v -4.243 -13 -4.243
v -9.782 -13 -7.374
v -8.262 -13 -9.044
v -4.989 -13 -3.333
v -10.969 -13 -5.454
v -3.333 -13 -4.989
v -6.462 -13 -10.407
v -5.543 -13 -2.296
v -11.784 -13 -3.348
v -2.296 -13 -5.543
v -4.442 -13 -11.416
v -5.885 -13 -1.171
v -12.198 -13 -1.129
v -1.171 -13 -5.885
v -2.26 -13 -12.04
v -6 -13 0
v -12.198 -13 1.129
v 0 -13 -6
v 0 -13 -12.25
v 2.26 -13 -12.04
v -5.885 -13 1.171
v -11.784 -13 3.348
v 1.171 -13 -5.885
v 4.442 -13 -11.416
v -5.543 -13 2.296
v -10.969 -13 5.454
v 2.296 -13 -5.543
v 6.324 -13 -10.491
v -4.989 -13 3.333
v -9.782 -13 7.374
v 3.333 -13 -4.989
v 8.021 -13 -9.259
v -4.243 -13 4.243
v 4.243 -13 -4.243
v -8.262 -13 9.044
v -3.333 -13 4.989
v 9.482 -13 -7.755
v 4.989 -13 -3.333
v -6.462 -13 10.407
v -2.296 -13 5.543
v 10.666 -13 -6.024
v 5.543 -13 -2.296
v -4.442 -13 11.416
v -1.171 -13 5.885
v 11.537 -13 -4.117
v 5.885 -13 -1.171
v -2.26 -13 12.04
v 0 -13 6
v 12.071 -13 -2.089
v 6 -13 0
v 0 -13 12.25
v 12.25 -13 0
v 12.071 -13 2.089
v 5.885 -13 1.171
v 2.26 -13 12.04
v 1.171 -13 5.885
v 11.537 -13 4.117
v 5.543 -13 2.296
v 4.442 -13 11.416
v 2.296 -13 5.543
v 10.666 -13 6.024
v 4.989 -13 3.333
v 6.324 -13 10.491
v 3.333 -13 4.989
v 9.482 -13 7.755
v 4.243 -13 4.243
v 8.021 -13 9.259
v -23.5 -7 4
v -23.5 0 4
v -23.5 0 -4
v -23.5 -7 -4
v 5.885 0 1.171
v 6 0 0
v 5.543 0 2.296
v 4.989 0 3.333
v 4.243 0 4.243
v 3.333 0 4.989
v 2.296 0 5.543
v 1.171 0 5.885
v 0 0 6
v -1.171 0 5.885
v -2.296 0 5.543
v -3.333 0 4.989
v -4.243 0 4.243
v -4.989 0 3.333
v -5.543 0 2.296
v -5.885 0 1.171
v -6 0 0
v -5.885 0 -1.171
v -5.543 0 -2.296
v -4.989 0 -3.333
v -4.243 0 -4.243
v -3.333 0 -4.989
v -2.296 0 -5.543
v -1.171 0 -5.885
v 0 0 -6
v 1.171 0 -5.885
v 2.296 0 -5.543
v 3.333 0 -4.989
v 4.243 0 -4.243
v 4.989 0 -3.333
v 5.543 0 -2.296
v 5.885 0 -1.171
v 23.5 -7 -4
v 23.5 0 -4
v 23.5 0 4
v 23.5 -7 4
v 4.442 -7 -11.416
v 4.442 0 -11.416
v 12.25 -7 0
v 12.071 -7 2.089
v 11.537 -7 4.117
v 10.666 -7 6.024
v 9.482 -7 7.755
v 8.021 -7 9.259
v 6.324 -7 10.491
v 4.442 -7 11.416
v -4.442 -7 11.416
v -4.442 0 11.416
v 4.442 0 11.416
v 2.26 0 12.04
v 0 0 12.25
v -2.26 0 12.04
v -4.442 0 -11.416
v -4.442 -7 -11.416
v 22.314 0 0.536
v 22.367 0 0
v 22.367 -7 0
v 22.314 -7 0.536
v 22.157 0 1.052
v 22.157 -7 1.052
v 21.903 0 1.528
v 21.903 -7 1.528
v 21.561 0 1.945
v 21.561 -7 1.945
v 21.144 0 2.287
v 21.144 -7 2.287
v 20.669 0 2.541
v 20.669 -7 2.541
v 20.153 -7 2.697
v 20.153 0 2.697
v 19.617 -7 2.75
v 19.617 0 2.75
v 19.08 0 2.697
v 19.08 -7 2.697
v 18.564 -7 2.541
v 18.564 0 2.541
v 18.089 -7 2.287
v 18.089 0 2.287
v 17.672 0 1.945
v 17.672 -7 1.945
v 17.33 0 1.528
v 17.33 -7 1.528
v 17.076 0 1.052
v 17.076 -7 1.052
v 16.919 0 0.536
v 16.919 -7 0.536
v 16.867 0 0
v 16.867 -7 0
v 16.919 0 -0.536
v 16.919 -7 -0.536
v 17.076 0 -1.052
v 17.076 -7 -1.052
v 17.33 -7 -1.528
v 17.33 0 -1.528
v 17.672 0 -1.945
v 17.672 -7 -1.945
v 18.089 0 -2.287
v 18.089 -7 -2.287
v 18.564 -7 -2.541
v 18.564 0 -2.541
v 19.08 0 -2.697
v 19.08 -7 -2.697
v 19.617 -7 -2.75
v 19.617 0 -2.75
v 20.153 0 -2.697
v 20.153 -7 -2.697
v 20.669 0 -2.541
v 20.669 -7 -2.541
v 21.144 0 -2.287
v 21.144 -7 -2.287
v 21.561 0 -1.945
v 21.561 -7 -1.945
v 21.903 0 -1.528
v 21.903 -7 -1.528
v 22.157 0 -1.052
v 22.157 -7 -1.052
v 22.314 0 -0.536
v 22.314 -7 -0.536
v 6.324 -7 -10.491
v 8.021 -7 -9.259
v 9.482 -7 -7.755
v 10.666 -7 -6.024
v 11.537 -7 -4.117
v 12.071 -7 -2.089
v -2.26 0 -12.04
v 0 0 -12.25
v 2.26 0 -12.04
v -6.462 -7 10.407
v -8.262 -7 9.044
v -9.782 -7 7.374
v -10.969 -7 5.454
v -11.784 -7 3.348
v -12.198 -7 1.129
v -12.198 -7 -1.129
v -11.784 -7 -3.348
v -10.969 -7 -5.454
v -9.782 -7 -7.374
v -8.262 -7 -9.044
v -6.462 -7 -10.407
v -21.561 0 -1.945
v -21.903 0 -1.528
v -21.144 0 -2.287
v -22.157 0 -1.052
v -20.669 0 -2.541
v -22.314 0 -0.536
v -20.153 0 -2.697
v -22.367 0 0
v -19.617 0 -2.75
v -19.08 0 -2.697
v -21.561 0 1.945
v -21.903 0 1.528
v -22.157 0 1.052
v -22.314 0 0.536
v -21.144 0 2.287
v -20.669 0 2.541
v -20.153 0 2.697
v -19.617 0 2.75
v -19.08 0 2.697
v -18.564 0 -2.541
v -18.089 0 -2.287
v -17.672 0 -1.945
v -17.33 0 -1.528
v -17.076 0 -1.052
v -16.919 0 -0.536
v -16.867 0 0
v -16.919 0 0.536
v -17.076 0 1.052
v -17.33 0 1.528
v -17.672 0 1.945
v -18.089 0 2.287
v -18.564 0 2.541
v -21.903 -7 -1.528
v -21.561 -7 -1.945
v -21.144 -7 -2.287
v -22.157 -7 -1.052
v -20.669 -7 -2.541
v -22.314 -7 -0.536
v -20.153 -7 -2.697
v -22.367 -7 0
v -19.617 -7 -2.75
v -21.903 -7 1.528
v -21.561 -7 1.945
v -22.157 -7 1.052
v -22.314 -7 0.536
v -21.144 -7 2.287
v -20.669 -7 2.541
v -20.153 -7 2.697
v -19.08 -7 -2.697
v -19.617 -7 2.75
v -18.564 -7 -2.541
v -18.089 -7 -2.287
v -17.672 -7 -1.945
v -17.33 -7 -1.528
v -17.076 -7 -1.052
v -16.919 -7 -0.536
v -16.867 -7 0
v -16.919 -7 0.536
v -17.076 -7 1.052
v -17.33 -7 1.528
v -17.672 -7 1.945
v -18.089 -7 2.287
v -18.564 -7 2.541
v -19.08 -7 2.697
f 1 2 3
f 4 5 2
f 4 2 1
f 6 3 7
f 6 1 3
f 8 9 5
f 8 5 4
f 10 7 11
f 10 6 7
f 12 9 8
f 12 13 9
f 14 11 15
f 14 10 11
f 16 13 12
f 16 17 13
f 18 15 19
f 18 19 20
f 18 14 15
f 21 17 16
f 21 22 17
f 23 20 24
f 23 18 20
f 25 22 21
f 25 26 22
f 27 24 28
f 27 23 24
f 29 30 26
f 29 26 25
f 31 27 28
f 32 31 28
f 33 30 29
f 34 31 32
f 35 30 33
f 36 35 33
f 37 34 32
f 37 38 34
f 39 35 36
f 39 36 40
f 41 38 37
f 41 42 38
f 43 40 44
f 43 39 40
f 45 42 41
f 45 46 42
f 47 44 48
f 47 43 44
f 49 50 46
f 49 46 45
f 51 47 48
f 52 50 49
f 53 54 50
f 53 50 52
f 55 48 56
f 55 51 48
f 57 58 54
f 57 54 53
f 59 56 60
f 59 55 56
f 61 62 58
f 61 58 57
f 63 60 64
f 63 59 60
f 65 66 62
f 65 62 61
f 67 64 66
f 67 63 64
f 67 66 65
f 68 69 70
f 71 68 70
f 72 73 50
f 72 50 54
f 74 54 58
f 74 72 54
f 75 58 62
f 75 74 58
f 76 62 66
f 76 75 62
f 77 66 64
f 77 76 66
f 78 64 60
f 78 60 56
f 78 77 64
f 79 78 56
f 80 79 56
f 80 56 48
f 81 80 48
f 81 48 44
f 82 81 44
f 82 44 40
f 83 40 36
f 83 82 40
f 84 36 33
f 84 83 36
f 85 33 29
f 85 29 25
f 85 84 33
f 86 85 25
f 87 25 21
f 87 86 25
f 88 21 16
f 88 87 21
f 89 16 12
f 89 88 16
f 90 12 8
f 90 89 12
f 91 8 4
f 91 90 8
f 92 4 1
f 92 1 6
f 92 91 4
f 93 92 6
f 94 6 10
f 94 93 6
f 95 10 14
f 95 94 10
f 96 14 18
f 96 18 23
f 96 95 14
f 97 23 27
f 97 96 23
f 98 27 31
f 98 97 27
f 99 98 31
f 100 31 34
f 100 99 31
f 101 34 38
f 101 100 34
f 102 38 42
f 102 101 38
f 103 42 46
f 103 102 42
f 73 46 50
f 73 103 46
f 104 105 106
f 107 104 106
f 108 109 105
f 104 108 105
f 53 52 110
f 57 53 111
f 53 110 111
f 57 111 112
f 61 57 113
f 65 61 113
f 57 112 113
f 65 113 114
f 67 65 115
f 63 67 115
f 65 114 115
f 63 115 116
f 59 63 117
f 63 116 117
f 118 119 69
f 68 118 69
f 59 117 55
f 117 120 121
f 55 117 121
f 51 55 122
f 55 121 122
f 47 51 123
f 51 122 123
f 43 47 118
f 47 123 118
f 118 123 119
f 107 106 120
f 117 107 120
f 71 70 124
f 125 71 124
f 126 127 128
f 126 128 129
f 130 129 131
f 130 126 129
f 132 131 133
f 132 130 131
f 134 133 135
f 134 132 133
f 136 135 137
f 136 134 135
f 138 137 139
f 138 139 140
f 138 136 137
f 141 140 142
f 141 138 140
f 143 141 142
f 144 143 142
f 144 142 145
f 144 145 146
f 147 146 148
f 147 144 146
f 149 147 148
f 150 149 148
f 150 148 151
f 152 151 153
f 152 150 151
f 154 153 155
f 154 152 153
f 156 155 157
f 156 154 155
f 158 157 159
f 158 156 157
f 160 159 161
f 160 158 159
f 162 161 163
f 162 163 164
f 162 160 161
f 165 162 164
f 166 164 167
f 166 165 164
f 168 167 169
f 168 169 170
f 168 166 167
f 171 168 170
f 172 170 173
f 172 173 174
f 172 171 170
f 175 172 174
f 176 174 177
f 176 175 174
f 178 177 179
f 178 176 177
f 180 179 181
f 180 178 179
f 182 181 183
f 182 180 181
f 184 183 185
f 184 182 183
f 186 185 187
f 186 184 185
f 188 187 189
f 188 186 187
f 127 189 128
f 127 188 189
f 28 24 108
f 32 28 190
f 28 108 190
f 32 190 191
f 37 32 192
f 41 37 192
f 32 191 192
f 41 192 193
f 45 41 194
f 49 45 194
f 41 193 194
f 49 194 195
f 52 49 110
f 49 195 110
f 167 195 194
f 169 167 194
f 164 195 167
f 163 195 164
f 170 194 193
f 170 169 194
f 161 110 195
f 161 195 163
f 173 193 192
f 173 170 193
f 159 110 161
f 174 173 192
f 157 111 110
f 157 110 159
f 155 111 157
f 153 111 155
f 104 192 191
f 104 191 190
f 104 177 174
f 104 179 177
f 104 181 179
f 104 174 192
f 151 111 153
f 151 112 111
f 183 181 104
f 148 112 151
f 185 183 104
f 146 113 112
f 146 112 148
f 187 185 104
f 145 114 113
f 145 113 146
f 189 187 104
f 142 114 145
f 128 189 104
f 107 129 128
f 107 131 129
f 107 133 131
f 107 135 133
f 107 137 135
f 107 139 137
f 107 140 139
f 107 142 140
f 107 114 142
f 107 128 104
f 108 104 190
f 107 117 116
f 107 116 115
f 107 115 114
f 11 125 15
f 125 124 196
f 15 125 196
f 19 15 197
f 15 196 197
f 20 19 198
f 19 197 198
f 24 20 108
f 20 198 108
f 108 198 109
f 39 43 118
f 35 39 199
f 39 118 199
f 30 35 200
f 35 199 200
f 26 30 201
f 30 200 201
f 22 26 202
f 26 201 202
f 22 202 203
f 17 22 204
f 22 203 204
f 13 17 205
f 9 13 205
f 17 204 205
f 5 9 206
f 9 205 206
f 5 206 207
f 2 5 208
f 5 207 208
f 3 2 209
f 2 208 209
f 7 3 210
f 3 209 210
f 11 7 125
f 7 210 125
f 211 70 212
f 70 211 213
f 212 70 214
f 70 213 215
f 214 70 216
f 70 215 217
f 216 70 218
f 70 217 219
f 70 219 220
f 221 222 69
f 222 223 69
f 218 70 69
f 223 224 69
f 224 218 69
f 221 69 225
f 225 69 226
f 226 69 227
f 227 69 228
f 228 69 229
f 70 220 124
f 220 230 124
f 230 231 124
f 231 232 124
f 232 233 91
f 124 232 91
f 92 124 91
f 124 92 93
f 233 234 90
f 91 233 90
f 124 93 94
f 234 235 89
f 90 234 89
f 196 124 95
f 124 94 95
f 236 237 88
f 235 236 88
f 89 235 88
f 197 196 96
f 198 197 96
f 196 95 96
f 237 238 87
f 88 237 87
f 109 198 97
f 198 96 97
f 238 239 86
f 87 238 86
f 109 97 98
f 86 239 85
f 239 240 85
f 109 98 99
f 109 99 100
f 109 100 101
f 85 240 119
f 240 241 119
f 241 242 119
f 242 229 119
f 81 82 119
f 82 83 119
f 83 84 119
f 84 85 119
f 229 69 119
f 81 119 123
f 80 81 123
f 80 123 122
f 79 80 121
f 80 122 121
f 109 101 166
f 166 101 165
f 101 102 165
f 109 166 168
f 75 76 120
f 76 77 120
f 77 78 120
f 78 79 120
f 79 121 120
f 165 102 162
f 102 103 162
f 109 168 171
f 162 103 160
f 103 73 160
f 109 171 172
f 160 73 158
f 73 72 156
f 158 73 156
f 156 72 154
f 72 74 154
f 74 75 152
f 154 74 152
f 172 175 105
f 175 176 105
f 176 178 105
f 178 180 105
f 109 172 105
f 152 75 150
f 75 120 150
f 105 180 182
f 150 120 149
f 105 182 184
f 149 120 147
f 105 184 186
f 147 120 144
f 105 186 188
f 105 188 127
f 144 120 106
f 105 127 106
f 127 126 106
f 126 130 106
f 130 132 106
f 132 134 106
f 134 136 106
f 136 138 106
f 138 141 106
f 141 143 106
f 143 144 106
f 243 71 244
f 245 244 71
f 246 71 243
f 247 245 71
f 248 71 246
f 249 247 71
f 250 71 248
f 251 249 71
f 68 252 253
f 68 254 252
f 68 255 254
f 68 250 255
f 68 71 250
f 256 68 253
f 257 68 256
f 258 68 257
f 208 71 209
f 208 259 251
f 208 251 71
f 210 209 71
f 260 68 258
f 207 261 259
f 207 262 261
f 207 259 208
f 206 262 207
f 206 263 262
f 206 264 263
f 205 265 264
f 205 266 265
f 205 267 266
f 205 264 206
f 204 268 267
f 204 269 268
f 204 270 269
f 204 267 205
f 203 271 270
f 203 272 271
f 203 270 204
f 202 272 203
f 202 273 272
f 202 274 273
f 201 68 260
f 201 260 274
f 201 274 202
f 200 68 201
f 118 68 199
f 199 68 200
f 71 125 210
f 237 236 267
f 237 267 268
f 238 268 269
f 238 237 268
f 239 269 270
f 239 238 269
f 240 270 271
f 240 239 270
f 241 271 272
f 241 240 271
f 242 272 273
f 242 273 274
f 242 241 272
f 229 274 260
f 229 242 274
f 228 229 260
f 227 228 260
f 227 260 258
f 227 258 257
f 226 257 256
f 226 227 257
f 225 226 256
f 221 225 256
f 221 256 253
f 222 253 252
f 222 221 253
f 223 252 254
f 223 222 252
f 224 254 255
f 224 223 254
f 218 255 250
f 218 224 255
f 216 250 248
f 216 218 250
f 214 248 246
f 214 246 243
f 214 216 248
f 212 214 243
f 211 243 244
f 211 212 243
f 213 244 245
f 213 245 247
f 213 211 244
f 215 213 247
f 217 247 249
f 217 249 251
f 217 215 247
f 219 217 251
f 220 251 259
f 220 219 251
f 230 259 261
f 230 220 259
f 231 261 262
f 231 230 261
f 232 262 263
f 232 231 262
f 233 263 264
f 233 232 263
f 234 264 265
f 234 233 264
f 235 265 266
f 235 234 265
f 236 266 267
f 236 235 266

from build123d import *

# Parameters (mm, degrees)
F0_R     = 6
F1_DEPTH = 13
F0_R_2   = 2.75
F2_DEPTH = 7


with BuildPart() as f1:
    # F0 (on Front) → F1 (new body)
    with BuildSketch(Plane.XZ):
        with BuildLine():
            ThreePointArc((4.442476, -11.416081), (10.11145, -6.915279), (12.25, 0))
            ThreePointArc((12.25, 0), (10.11145, 6.915279), (4.442476, 11.416081))
            ThreePointArc((4.442476, 11.416081), (0, 12.25), (-4.442476, 11.416081))
            ThreePointArc((-4.442476, 11.416081), (-12.25, 0), (-4.442476, -11.416081))
            ThreePointArc((-4.442476, -11.416081), (0, -12.25), (4.442476, -11.416081))
        make_face()
        Circle(F0_R, mode=Mode.SUBTRACT)
    extrude(amount=F1_DEPTH)

    # F0 (on Front) → F2 (join)
    with BuildSketch(Plane.XZ):
        with BuildLine():
            ThreePointArc((-4.442476, -11.416081), (-12.25, 0), (-4.442476, 11.416081))
            Line((-4.442476, 11.416081), (-23.5, 4))
            Line((-23.5, 4), (-23.5, 0))
            Line((-23.5, 0), (-23.5, -4))
            Line((-23.5, -4), (-4.442476, -11.416081))
        make_face()
        with Locations((-19.616572, 0)):
            Circle(F0_R_2, mode=Mode.SUBTRACT)
        with BuildLine():
            ThreePointArc((4.442476, 11.416081), (10.11145, 6.915279), (12.25, 0))
            ThreePointArc((12.25, 0), (10.11145, -6.915279), (4.442476, -11.416081))
            Line((4.442476, -11.416081), (23.5, -4))
            Line((23.5, -4), (23.5, 0))
            Line((23.5, 0), (23.5, 4))
            Line((23.5, 4), (4.442476, 11.416081))
        make_face()
        with Locations((19.616572, 0)):
            Circle(F0_R_2, mode=Mode.SUBTRACT)
    extrude(amount=F2_DEPTH)


solid = f1.part
